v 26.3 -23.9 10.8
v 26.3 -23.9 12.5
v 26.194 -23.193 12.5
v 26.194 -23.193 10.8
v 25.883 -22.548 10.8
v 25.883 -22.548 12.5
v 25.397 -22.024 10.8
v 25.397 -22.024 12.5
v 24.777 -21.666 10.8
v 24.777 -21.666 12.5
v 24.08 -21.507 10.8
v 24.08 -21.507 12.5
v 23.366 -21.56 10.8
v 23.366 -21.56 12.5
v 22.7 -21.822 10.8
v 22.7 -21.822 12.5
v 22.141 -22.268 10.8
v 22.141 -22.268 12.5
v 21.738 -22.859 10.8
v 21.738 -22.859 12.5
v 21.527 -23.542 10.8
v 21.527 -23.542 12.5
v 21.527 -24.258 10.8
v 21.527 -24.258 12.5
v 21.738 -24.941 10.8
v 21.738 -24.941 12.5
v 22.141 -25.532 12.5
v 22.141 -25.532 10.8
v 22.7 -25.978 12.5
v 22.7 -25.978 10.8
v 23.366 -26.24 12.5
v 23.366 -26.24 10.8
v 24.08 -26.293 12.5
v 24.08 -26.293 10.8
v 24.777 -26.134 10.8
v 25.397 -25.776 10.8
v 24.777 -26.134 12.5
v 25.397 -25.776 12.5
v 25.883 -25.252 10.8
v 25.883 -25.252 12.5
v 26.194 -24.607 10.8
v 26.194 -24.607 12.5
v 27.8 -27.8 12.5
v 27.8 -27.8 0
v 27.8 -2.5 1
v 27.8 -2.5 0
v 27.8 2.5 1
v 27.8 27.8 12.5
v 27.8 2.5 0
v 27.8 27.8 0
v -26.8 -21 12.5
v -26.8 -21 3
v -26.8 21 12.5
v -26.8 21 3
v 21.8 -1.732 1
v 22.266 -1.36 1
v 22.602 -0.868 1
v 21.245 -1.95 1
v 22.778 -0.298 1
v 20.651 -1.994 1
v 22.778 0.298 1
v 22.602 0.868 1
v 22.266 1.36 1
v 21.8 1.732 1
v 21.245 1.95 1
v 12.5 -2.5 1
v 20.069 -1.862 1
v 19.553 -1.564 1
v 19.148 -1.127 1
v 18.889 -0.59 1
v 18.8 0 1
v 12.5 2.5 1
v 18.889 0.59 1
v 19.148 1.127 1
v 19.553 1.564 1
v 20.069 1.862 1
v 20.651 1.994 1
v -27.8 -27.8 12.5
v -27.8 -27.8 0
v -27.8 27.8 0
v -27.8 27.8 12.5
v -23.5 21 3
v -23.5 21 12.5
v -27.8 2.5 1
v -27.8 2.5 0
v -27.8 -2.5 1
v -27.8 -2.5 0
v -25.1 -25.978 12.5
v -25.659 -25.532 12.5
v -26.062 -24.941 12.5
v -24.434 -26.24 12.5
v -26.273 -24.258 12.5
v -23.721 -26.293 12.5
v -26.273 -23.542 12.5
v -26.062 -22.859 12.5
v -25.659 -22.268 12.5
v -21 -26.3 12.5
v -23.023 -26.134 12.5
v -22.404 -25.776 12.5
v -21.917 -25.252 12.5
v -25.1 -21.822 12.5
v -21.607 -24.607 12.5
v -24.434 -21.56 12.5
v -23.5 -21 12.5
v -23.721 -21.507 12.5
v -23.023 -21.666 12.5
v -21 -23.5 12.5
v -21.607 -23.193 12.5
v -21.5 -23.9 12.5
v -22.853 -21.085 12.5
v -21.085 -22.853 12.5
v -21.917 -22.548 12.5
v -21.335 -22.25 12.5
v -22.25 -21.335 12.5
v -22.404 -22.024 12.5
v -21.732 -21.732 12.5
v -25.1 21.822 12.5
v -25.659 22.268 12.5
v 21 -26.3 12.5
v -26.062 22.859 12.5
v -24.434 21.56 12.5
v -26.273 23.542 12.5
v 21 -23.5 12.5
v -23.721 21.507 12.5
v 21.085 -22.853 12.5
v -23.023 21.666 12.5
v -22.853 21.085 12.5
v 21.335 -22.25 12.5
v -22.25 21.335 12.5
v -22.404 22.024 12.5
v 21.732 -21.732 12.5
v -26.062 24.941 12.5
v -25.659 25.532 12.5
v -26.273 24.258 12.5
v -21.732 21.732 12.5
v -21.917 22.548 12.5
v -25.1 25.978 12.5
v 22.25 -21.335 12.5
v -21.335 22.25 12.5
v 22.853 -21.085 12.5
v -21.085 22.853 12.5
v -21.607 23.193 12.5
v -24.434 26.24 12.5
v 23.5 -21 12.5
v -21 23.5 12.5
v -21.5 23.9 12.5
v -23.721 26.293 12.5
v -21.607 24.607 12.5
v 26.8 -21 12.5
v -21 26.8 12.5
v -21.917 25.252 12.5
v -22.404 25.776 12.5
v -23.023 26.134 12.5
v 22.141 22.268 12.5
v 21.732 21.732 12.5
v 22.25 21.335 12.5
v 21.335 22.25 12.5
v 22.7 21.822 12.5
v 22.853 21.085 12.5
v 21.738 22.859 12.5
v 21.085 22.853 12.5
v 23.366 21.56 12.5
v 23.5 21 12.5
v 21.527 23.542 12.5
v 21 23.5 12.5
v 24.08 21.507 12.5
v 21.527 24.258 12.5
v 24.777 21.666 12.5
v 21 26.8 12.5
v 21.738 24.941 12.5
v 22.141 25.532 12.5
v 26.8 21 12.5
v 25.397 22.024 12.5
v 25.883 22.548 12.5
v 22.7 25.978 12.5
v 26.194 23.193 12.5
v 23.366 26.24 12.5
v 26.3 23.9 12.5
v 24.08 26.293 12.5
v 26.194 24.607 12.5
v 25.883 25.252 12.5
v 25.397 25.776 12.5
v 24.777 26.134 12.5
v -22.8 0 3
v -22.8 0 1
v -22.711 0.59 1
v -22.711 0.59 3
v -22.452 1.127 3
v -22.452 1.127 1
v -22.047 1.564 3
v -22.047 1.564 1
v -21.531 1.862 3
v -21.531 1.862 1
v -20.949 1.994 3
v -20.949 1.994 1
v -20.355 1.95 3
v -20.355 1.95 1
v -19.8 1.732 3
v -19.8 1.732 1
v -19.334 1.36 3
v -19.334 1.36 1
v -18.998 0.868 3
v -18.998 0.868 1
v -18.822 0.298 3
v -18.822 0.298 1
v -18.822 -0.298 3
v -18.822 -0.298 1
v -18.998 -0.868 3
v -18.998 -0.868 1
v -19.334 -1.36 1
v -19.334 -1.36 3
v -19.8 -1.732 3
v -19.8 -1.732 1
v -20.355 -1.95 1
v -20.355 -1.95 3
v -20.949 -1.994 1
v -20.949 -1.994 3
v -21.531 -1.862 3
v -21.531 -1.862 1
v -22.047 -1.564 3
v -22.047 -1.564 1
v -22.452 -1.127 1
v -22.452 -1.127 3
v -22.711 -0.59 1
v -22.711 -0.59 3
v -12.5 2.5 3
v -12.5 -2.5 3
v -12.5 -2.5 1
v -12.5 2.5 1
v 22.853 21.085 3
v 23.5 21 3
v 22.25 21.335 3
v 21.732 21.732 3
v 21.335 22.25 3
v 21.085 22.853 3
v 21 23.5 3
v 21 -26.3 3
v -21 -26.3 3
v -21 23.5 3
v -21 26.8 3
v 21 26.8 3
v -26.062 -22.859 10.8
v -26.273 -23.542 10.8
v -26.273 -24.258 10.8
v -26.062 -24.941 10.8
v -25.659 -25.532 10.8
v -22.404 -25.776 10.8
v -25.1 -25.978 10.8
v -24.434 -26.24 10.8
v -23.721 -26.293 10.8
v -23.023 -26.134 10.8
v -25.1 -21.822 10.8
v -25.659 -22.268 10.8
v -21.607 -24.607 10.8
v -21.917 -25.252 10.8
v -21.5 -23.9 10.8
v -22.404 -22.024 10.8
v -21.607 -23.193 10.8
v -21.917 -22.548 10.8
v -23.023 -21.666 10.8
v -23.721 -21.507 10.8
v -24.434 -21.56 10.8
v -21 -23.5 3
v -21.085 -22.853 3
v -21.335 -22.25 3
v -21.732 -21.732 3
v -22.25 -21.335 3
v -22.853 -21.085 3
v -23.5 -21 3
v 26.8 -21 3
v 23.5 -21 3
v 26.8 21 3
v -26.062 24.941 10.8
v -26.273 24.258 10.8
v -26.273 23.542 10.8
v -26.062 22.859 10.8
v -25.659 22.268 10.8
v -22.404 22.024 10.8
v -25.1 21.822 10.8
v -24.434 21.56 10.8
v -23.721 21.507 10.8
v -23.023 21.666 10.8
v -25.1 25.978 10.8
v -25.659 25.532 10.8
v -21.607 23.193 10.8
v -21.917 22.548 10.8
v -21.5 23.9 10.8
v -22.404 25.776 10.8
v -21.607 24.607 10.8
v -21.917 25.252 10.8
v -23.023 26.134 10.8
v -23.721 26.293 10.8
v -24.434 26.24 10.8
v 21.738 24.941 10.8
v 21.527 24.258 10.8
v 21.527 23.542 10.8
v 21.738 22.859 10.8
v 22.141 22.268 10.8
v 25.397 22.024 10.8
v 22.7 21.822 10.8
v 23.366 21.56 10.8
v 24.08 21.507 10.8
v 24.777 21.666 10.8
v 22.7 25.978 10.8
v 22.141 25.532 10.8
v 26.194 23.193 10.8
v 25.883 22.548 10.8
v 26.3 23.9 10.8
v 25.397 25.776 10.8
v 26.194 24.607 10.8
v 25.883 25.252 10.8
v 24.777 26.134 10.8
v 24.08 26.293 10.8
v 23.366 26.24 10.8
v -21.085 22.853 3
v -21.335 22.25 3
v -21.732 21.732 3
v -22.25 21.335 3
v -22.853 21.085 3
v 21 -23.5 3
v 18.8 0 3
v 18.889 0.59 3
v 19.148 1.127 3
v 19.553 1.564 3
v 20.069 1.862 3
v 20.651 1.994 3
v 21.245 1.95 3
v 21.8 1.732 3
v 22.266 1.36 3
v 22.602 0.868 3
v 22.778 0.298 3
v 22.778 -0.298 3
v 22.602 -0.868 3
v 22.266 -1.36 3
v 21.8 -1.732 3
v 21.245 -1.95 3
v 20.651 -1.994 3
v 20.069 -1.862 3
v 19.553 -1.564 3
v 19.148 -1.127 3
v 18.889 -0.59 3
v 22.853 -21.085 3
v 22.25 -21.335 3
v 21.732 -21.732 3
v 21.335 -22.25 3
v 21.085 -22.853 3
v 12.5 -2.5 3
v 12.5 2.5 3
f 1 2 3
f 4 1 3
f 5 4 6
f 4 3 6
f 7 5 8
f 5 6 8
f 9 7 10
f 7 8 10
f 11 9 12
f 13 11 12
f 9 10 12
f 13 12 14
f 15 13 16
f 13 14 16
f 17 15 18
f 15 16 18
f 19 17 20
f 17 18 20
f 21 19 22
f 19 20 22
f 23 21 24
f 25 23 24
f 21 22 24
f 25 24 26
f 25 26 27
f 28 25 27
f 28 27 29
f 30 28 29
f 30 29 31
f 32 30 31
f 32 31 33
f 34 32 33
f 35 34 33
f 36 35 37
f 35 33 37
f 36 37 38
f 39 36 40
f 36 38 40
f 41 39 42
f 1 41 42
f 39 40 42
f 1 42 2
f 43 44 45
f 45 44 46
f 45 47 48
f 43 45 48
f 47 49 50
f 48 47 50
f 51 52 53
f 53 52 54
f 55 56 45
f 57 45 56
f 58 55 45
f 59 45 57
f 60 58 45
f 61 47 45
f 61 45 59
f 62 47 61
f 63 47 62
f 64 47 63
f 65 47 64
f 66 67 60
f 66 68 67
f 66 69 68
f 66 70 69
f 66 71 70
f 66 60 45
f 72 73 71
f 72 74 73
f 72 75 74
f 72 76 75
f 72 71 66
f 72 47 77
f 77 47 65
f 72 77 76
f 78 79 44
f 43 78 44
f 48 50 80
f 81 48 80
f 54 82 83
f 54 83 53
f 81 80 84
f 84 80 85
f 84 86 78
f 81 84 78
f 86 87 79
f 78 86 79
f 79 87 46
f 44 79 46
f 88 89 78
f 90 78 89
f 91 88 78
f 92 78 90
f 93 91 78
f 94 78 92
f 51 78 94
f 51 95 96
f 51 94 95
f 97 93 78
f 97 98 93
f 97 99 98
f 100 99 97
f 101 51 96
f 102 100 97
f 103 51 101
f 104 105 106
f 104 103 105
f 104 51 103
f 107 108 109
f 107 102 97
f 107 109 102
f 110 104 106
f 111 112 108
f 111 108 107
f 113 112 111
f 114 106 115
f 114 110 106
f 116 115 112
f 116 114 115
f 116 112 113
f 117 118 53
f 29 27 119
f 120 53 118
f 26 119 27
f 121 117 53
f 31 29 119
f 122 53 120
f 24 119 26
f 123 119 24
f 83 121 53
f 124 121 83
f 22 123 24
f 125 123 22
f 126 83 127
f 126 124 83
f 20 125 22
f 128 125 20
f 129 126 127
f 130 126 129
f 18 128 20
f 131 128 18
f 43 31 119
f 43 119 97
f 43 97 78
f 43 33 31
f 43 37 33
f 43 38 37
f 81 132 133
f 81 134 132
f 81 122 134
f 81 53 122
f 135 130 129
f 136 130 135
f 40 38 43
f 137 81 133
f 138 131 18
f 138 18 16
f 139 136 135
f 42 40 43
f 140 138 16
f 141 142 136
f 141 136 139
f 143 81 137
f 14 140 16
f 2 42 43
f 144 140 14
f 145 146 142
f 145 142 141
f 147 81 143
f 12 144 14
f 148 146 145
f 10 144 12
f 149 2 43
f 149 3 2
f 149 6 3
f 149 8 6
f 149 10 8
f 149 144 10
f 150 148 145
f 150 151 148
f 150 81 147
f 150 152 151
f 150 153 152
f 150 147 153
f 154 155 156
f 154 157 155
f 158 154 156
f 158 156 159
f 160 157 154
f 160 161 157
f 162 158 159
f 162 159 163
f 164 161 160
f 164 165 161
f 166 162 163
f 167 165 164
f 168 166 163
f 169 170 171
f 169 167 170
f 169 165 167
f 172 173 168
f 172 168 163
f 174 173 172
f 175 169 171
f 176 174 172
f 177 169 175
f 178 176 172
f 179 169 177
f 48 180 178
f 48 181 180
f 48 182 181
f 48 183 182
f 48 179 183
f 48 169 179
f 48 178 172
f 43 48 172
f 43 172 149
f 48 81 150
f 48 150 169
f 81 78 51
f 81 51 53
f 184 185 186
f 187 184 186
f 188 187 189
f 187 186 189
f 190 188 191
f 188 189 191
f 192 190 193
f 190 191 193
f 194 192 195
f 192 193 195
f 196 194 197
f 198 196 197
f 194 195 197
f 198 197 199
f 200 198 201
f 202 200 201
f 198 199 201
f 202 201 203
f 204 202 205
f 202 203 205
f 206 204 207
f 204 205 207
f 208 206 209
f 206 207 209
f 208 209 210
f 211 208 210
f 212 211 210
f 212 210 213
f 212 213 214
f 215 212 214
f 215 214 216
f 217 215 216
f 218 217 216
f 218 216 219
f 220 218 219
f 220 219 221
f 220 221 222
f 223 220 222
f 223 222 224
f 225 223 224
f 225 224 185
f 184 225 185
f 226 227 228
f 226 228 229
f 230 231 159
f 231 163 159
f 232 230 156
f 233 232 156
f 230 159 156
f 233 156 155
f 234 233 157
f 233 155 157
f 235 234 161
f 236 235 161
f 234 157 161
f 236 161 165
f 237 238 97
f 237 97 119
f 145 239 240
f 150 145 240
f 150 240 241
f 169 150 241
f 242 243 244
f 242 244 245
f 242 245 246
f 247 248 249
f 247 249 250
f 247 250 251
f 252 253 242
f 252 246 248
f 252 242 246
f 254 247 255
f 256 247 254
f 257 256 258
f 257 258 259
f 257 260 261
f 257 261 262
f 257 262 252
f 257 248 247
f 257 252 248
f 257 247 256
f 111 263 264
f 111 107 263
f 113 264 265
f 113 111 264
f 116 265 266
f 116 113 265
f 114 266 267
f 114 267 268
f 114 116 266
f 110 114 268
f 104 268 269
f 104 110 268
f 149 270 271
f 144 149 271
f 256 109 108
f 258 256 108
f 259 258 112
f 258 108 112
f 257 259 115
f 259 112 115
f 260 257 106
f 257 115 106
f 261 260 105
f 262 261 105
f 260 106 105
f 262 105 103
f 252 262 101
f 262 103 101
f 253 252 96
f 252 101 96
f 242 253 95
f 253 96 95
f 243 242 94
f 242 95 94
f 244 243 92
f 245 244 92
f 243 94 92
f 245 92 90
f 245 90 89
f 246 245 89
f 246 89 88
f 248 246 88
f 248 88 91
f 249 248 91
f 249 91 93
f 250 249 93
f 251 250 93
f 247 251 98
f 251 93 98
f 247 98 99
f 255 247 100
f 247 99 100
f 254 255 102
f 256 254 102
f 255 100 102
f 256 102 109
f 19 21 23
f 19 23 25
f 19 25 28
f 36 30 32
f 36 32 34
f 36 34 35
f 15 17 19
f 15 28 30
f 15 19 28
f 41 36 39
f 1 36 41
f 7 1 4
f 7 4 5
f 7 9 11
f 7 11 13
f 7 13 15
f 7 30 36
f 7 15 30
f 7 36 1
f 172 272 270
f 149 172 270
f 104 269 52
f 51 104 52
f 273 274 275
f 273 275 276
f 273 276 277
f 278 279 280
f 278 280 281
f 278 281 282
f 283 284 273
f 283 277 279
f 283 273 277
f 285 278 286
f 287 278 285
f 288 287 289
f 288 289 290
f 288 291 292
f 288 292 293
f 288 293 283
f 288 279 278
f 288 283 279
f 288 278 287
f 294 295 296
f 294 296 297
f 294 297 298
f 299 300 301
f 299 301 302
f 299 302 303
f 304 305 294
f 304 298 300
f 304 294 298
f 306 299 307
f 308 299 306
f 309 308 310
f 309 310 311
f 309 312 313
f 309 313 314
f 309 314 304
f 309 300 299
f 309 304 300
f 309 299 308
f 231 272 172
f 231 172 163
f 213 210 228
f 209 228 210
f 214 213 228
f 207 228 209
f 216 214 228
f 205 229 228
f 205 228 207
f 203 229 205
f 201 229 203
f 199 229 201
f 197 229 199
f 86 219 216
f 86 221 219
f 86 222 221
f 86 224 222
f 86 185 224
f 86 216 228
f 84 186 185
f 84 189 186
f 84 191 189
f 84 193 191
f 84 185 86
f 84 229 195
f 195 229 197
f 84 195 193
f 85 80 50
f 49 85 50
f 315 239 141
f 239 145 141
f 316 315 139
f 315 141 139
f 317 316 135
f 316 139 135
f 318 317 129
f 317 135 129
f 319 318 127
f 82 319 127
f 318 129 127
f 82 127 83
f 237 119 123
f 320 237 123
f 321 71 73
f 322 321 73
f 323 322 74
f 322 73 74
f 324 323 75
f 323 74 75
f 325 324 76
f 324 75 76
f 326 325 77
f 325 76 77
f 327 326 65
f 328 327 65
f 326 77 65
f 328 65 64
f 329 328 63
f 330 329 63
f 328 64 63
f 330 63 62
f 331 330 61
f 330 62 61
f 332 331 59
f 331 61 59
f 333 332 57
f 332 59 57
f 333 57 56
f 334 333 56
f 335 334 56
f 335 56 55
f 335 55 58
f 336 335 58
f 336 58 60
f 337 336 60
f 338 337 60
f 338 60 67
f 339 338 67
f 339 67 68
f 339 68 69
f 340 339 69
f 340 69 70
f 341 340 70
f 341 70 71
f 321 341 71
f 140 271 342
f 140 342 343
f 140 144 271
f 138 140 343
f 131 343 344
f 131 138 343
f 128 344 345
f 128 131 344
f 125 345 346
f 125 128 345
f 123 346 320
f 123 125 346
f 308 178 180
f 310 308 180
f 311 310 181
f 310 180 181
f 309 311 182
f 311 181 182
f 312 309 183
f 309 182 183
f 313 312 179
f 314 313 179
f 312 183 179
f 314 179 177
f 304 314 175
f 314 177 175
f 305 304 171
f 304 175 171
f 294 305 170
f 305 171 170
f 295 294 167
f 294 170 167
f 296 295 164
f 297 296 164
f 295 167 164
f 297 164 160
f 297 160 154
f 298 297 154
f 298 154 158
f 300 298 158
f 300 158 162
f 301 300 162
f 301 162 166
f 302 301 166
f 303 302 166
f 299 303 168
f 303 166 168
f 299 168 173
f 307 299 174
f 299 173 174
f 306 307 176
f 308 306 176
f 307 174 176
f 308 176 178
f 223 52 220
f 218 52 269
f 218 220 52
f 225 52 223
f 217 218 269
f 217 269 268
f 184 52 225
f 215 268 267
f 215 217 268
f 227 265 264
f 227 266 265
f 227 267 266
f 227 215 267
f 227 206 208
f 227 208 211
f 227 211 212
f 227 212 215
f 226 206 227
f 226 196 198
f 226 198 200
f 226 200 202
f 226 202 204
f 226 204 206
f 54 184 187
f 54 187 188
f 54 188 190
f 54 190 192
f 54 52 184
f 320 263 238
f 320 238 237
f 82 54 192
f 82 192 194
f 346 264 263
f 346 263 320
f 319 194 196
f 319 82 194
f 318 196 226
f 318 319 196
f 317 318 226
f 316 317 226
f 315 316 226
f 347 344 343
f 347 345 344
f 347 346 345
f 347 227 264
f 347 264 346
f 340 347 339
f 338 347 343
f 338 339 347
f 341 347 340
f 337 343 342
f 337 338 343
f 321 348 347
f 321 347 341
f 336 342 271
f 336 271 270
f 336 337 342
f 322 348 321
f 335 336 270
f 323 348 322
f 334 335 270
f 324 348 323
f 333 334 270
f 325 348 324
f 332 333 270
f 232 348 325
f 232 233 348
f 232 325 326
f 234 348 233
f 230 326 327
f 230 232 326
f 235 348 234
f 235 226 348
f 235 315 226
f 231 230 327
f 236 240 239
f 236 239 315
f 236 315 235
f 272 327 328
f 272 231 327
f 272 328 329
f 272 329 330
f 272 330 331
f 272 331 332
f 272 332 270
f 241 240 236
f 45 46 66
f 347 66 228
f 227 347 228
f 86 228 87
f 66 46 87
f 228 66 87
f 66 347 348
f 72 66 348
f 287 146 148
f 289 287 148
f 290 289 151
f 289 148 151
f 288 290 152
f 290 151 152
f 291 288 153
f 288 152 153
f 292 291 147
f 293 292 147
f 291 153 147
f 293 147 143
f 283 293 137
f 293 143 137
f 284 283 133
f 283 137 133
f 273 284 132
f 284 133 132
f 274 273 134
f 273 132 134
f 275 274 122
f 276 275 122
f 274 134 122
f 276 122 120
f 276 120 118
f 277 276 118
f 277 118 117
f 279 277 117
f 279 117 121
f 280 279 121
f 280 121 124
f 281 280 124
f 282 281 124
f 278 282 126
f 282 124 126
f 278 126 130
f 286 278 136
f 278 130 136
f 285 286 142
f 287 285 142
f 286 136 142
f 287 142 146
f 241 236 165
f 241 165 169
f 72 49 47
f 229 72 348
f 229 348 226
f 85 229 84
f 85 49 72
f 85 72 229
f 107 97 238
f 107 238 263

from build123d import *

# Parameters (mm, degrees)
SKICA1_W                 = 55.6
SKICA1_H                 = 55.6
P_IDAT_VYSUNUT_M2_DEPTH  = 3
SKICA4_W                 = 25
SKICA4_H                 = 5
ODEBRAT_VYSUNUT_M1_DEPTH = 2
SKICA5_W                 = 55.6
SKICA5_H                 = 5
ODEBRAT_VYSUNUT_M3_DEPTH = 1
SKICA14_W                = 53.6
SKICA14_H                = 1.5
P_IDAT_VYSUNUT_M9_DEPTH  = 9.5
SKICA17_R                = 2
ODEBRAT_VYSUNUT_M8_DEPTH = 4
SKICA19_W                = 6.8
SKICA19_H                = 6.8
P_IDAT_VYSUNUT_M10_DEPTH = 12.5
SKICA20_R                = 2.4
ODEBRAT_VYSUNUT_M9_DEPTH = 1.7
ZAOBLIT1_R               = 2.5


with BuildPart() as part:
    # Skica1 → Přidat vysunutím2 (new body)
    with BuildSketch(Plane.XY):
        Rectangle(SKICA1_W, SKICA1_H)
    extrude(amount=P_IDAT_VYSUNUT_M2_DEPTH)

    # Skica4 → Odebrat vysunutím1 (cut)
    with BuildSketch(Plane.XY.offset(3)):
        Rectangle(SKICA4_W, SKICA4_H)
    extrude(amount=-ODEBRAT_VYSUNUT_M1_DEPTH, mode=Mode.SUBTRACT)

    # Skica5 → Odebrat vysunutím3 (cut)
    with BuildSketch(Plane(origin=(0, 0, 0), x_dir=(-1, 0, 0), z_dir=(0, 0, -1))):
        Rectangle(SKICA5_W, SKICA5_H)
    extrude(amount=-ODEBRAT_VYSUNUT_M3_DEPTH, mode=Mode.SUBTRACT)

    # Skica14 → Přidat vysunutím9 (add)
    with BuildSketch(Plane.XY.offset(3)):
        Polygon((27.8, 27.8), (-27.8, 27.8), (-27.8, -27.8), (-26.8, -27.8), (-26.8, -26.8), (-26.8, -26.3), (-26.8, 26.8), (26.8, 26.8), (26.8, -26.3), (26.8, -27.8), (27.8, -27.8), align=None)
        with Locations((0, -27.05)):
            Rectangle(SKICA14_W, SKICA14_H)
    extrude(amount=P_IDAT_VYSUNUT_M9_DEPTH)

    # Skica17 → Odebrat vysunutím8 (cut)
    with BuildSketch(Plane(origin=(0, 0, 1), x_dir=(-1, 0, 0), z_dir=(0, 0, -1))):
        with Locations((-20.8, 0)):
            Circle(SKICA17_R)
        with Locations((20.8, 0)):
            Circle(SKICA17_R)
    extrude(amount=-ODEBRAT_VYSUNUT_M8_DEPTH, mode=Mode.SUBTRACT)

    # Skica19 → Přidat vysunutím10 (add)
    with BuildSketch(Plane(origin=(0, 0, 0), x_dir=(-1, 0, 0), z_dir=(0, 0, -1))):
        with Locations((-24.4, 24.4)):
            Rectangle(SKICA19_W, SKICA19_H)
        with Locations((24.4, 24.4)):
            Rectangle(SKICA19_W, SKICA19_H)
        with Locations((-24.4, -24.4)):
            Rectangle(SKICA19_W, SKICA19_H)
        with Locations((24.4, -24.4)):
            Rectangle(SKICA19_W, SKICA19_H)
    extrude(amount=-P_IDAT_VYSUNUT_M10_DEPTH)

    # Skica20 → Odebrat vysunutím9 (cut)
    with BuildSketch(Plane.XY.offset(12.5)):
        with Locations((-23.9, -23.9)):
            Circle(SKICA20_R)
        with Locations((-23.9, 23.9)):
            Circle(SKICA20_R)
        with Locations((23.900280565, 23.9)):
            Circle(SKICA20_R)
        with Locations((23.900280565, -23.9)):
            Circle(SKICA20_R)
    extrude(amount=-ODEBRAT_VYSUNUT_M9_DEPTH, mode=Mode.SUBTRACT)

    # Zaoblit1
    zaoblit1_edges = [part.edges().sort_by_distance(p)[0] for p in [
        (-21, 21, 7.75),
        (21, -21, 7.75),
        (-21, -21, 7.75),
        (21, 21, 7.75),
    ]]
    fillet(zaoblit1_edges, radius=ZAOBLIT1_R)


solid = part.part
